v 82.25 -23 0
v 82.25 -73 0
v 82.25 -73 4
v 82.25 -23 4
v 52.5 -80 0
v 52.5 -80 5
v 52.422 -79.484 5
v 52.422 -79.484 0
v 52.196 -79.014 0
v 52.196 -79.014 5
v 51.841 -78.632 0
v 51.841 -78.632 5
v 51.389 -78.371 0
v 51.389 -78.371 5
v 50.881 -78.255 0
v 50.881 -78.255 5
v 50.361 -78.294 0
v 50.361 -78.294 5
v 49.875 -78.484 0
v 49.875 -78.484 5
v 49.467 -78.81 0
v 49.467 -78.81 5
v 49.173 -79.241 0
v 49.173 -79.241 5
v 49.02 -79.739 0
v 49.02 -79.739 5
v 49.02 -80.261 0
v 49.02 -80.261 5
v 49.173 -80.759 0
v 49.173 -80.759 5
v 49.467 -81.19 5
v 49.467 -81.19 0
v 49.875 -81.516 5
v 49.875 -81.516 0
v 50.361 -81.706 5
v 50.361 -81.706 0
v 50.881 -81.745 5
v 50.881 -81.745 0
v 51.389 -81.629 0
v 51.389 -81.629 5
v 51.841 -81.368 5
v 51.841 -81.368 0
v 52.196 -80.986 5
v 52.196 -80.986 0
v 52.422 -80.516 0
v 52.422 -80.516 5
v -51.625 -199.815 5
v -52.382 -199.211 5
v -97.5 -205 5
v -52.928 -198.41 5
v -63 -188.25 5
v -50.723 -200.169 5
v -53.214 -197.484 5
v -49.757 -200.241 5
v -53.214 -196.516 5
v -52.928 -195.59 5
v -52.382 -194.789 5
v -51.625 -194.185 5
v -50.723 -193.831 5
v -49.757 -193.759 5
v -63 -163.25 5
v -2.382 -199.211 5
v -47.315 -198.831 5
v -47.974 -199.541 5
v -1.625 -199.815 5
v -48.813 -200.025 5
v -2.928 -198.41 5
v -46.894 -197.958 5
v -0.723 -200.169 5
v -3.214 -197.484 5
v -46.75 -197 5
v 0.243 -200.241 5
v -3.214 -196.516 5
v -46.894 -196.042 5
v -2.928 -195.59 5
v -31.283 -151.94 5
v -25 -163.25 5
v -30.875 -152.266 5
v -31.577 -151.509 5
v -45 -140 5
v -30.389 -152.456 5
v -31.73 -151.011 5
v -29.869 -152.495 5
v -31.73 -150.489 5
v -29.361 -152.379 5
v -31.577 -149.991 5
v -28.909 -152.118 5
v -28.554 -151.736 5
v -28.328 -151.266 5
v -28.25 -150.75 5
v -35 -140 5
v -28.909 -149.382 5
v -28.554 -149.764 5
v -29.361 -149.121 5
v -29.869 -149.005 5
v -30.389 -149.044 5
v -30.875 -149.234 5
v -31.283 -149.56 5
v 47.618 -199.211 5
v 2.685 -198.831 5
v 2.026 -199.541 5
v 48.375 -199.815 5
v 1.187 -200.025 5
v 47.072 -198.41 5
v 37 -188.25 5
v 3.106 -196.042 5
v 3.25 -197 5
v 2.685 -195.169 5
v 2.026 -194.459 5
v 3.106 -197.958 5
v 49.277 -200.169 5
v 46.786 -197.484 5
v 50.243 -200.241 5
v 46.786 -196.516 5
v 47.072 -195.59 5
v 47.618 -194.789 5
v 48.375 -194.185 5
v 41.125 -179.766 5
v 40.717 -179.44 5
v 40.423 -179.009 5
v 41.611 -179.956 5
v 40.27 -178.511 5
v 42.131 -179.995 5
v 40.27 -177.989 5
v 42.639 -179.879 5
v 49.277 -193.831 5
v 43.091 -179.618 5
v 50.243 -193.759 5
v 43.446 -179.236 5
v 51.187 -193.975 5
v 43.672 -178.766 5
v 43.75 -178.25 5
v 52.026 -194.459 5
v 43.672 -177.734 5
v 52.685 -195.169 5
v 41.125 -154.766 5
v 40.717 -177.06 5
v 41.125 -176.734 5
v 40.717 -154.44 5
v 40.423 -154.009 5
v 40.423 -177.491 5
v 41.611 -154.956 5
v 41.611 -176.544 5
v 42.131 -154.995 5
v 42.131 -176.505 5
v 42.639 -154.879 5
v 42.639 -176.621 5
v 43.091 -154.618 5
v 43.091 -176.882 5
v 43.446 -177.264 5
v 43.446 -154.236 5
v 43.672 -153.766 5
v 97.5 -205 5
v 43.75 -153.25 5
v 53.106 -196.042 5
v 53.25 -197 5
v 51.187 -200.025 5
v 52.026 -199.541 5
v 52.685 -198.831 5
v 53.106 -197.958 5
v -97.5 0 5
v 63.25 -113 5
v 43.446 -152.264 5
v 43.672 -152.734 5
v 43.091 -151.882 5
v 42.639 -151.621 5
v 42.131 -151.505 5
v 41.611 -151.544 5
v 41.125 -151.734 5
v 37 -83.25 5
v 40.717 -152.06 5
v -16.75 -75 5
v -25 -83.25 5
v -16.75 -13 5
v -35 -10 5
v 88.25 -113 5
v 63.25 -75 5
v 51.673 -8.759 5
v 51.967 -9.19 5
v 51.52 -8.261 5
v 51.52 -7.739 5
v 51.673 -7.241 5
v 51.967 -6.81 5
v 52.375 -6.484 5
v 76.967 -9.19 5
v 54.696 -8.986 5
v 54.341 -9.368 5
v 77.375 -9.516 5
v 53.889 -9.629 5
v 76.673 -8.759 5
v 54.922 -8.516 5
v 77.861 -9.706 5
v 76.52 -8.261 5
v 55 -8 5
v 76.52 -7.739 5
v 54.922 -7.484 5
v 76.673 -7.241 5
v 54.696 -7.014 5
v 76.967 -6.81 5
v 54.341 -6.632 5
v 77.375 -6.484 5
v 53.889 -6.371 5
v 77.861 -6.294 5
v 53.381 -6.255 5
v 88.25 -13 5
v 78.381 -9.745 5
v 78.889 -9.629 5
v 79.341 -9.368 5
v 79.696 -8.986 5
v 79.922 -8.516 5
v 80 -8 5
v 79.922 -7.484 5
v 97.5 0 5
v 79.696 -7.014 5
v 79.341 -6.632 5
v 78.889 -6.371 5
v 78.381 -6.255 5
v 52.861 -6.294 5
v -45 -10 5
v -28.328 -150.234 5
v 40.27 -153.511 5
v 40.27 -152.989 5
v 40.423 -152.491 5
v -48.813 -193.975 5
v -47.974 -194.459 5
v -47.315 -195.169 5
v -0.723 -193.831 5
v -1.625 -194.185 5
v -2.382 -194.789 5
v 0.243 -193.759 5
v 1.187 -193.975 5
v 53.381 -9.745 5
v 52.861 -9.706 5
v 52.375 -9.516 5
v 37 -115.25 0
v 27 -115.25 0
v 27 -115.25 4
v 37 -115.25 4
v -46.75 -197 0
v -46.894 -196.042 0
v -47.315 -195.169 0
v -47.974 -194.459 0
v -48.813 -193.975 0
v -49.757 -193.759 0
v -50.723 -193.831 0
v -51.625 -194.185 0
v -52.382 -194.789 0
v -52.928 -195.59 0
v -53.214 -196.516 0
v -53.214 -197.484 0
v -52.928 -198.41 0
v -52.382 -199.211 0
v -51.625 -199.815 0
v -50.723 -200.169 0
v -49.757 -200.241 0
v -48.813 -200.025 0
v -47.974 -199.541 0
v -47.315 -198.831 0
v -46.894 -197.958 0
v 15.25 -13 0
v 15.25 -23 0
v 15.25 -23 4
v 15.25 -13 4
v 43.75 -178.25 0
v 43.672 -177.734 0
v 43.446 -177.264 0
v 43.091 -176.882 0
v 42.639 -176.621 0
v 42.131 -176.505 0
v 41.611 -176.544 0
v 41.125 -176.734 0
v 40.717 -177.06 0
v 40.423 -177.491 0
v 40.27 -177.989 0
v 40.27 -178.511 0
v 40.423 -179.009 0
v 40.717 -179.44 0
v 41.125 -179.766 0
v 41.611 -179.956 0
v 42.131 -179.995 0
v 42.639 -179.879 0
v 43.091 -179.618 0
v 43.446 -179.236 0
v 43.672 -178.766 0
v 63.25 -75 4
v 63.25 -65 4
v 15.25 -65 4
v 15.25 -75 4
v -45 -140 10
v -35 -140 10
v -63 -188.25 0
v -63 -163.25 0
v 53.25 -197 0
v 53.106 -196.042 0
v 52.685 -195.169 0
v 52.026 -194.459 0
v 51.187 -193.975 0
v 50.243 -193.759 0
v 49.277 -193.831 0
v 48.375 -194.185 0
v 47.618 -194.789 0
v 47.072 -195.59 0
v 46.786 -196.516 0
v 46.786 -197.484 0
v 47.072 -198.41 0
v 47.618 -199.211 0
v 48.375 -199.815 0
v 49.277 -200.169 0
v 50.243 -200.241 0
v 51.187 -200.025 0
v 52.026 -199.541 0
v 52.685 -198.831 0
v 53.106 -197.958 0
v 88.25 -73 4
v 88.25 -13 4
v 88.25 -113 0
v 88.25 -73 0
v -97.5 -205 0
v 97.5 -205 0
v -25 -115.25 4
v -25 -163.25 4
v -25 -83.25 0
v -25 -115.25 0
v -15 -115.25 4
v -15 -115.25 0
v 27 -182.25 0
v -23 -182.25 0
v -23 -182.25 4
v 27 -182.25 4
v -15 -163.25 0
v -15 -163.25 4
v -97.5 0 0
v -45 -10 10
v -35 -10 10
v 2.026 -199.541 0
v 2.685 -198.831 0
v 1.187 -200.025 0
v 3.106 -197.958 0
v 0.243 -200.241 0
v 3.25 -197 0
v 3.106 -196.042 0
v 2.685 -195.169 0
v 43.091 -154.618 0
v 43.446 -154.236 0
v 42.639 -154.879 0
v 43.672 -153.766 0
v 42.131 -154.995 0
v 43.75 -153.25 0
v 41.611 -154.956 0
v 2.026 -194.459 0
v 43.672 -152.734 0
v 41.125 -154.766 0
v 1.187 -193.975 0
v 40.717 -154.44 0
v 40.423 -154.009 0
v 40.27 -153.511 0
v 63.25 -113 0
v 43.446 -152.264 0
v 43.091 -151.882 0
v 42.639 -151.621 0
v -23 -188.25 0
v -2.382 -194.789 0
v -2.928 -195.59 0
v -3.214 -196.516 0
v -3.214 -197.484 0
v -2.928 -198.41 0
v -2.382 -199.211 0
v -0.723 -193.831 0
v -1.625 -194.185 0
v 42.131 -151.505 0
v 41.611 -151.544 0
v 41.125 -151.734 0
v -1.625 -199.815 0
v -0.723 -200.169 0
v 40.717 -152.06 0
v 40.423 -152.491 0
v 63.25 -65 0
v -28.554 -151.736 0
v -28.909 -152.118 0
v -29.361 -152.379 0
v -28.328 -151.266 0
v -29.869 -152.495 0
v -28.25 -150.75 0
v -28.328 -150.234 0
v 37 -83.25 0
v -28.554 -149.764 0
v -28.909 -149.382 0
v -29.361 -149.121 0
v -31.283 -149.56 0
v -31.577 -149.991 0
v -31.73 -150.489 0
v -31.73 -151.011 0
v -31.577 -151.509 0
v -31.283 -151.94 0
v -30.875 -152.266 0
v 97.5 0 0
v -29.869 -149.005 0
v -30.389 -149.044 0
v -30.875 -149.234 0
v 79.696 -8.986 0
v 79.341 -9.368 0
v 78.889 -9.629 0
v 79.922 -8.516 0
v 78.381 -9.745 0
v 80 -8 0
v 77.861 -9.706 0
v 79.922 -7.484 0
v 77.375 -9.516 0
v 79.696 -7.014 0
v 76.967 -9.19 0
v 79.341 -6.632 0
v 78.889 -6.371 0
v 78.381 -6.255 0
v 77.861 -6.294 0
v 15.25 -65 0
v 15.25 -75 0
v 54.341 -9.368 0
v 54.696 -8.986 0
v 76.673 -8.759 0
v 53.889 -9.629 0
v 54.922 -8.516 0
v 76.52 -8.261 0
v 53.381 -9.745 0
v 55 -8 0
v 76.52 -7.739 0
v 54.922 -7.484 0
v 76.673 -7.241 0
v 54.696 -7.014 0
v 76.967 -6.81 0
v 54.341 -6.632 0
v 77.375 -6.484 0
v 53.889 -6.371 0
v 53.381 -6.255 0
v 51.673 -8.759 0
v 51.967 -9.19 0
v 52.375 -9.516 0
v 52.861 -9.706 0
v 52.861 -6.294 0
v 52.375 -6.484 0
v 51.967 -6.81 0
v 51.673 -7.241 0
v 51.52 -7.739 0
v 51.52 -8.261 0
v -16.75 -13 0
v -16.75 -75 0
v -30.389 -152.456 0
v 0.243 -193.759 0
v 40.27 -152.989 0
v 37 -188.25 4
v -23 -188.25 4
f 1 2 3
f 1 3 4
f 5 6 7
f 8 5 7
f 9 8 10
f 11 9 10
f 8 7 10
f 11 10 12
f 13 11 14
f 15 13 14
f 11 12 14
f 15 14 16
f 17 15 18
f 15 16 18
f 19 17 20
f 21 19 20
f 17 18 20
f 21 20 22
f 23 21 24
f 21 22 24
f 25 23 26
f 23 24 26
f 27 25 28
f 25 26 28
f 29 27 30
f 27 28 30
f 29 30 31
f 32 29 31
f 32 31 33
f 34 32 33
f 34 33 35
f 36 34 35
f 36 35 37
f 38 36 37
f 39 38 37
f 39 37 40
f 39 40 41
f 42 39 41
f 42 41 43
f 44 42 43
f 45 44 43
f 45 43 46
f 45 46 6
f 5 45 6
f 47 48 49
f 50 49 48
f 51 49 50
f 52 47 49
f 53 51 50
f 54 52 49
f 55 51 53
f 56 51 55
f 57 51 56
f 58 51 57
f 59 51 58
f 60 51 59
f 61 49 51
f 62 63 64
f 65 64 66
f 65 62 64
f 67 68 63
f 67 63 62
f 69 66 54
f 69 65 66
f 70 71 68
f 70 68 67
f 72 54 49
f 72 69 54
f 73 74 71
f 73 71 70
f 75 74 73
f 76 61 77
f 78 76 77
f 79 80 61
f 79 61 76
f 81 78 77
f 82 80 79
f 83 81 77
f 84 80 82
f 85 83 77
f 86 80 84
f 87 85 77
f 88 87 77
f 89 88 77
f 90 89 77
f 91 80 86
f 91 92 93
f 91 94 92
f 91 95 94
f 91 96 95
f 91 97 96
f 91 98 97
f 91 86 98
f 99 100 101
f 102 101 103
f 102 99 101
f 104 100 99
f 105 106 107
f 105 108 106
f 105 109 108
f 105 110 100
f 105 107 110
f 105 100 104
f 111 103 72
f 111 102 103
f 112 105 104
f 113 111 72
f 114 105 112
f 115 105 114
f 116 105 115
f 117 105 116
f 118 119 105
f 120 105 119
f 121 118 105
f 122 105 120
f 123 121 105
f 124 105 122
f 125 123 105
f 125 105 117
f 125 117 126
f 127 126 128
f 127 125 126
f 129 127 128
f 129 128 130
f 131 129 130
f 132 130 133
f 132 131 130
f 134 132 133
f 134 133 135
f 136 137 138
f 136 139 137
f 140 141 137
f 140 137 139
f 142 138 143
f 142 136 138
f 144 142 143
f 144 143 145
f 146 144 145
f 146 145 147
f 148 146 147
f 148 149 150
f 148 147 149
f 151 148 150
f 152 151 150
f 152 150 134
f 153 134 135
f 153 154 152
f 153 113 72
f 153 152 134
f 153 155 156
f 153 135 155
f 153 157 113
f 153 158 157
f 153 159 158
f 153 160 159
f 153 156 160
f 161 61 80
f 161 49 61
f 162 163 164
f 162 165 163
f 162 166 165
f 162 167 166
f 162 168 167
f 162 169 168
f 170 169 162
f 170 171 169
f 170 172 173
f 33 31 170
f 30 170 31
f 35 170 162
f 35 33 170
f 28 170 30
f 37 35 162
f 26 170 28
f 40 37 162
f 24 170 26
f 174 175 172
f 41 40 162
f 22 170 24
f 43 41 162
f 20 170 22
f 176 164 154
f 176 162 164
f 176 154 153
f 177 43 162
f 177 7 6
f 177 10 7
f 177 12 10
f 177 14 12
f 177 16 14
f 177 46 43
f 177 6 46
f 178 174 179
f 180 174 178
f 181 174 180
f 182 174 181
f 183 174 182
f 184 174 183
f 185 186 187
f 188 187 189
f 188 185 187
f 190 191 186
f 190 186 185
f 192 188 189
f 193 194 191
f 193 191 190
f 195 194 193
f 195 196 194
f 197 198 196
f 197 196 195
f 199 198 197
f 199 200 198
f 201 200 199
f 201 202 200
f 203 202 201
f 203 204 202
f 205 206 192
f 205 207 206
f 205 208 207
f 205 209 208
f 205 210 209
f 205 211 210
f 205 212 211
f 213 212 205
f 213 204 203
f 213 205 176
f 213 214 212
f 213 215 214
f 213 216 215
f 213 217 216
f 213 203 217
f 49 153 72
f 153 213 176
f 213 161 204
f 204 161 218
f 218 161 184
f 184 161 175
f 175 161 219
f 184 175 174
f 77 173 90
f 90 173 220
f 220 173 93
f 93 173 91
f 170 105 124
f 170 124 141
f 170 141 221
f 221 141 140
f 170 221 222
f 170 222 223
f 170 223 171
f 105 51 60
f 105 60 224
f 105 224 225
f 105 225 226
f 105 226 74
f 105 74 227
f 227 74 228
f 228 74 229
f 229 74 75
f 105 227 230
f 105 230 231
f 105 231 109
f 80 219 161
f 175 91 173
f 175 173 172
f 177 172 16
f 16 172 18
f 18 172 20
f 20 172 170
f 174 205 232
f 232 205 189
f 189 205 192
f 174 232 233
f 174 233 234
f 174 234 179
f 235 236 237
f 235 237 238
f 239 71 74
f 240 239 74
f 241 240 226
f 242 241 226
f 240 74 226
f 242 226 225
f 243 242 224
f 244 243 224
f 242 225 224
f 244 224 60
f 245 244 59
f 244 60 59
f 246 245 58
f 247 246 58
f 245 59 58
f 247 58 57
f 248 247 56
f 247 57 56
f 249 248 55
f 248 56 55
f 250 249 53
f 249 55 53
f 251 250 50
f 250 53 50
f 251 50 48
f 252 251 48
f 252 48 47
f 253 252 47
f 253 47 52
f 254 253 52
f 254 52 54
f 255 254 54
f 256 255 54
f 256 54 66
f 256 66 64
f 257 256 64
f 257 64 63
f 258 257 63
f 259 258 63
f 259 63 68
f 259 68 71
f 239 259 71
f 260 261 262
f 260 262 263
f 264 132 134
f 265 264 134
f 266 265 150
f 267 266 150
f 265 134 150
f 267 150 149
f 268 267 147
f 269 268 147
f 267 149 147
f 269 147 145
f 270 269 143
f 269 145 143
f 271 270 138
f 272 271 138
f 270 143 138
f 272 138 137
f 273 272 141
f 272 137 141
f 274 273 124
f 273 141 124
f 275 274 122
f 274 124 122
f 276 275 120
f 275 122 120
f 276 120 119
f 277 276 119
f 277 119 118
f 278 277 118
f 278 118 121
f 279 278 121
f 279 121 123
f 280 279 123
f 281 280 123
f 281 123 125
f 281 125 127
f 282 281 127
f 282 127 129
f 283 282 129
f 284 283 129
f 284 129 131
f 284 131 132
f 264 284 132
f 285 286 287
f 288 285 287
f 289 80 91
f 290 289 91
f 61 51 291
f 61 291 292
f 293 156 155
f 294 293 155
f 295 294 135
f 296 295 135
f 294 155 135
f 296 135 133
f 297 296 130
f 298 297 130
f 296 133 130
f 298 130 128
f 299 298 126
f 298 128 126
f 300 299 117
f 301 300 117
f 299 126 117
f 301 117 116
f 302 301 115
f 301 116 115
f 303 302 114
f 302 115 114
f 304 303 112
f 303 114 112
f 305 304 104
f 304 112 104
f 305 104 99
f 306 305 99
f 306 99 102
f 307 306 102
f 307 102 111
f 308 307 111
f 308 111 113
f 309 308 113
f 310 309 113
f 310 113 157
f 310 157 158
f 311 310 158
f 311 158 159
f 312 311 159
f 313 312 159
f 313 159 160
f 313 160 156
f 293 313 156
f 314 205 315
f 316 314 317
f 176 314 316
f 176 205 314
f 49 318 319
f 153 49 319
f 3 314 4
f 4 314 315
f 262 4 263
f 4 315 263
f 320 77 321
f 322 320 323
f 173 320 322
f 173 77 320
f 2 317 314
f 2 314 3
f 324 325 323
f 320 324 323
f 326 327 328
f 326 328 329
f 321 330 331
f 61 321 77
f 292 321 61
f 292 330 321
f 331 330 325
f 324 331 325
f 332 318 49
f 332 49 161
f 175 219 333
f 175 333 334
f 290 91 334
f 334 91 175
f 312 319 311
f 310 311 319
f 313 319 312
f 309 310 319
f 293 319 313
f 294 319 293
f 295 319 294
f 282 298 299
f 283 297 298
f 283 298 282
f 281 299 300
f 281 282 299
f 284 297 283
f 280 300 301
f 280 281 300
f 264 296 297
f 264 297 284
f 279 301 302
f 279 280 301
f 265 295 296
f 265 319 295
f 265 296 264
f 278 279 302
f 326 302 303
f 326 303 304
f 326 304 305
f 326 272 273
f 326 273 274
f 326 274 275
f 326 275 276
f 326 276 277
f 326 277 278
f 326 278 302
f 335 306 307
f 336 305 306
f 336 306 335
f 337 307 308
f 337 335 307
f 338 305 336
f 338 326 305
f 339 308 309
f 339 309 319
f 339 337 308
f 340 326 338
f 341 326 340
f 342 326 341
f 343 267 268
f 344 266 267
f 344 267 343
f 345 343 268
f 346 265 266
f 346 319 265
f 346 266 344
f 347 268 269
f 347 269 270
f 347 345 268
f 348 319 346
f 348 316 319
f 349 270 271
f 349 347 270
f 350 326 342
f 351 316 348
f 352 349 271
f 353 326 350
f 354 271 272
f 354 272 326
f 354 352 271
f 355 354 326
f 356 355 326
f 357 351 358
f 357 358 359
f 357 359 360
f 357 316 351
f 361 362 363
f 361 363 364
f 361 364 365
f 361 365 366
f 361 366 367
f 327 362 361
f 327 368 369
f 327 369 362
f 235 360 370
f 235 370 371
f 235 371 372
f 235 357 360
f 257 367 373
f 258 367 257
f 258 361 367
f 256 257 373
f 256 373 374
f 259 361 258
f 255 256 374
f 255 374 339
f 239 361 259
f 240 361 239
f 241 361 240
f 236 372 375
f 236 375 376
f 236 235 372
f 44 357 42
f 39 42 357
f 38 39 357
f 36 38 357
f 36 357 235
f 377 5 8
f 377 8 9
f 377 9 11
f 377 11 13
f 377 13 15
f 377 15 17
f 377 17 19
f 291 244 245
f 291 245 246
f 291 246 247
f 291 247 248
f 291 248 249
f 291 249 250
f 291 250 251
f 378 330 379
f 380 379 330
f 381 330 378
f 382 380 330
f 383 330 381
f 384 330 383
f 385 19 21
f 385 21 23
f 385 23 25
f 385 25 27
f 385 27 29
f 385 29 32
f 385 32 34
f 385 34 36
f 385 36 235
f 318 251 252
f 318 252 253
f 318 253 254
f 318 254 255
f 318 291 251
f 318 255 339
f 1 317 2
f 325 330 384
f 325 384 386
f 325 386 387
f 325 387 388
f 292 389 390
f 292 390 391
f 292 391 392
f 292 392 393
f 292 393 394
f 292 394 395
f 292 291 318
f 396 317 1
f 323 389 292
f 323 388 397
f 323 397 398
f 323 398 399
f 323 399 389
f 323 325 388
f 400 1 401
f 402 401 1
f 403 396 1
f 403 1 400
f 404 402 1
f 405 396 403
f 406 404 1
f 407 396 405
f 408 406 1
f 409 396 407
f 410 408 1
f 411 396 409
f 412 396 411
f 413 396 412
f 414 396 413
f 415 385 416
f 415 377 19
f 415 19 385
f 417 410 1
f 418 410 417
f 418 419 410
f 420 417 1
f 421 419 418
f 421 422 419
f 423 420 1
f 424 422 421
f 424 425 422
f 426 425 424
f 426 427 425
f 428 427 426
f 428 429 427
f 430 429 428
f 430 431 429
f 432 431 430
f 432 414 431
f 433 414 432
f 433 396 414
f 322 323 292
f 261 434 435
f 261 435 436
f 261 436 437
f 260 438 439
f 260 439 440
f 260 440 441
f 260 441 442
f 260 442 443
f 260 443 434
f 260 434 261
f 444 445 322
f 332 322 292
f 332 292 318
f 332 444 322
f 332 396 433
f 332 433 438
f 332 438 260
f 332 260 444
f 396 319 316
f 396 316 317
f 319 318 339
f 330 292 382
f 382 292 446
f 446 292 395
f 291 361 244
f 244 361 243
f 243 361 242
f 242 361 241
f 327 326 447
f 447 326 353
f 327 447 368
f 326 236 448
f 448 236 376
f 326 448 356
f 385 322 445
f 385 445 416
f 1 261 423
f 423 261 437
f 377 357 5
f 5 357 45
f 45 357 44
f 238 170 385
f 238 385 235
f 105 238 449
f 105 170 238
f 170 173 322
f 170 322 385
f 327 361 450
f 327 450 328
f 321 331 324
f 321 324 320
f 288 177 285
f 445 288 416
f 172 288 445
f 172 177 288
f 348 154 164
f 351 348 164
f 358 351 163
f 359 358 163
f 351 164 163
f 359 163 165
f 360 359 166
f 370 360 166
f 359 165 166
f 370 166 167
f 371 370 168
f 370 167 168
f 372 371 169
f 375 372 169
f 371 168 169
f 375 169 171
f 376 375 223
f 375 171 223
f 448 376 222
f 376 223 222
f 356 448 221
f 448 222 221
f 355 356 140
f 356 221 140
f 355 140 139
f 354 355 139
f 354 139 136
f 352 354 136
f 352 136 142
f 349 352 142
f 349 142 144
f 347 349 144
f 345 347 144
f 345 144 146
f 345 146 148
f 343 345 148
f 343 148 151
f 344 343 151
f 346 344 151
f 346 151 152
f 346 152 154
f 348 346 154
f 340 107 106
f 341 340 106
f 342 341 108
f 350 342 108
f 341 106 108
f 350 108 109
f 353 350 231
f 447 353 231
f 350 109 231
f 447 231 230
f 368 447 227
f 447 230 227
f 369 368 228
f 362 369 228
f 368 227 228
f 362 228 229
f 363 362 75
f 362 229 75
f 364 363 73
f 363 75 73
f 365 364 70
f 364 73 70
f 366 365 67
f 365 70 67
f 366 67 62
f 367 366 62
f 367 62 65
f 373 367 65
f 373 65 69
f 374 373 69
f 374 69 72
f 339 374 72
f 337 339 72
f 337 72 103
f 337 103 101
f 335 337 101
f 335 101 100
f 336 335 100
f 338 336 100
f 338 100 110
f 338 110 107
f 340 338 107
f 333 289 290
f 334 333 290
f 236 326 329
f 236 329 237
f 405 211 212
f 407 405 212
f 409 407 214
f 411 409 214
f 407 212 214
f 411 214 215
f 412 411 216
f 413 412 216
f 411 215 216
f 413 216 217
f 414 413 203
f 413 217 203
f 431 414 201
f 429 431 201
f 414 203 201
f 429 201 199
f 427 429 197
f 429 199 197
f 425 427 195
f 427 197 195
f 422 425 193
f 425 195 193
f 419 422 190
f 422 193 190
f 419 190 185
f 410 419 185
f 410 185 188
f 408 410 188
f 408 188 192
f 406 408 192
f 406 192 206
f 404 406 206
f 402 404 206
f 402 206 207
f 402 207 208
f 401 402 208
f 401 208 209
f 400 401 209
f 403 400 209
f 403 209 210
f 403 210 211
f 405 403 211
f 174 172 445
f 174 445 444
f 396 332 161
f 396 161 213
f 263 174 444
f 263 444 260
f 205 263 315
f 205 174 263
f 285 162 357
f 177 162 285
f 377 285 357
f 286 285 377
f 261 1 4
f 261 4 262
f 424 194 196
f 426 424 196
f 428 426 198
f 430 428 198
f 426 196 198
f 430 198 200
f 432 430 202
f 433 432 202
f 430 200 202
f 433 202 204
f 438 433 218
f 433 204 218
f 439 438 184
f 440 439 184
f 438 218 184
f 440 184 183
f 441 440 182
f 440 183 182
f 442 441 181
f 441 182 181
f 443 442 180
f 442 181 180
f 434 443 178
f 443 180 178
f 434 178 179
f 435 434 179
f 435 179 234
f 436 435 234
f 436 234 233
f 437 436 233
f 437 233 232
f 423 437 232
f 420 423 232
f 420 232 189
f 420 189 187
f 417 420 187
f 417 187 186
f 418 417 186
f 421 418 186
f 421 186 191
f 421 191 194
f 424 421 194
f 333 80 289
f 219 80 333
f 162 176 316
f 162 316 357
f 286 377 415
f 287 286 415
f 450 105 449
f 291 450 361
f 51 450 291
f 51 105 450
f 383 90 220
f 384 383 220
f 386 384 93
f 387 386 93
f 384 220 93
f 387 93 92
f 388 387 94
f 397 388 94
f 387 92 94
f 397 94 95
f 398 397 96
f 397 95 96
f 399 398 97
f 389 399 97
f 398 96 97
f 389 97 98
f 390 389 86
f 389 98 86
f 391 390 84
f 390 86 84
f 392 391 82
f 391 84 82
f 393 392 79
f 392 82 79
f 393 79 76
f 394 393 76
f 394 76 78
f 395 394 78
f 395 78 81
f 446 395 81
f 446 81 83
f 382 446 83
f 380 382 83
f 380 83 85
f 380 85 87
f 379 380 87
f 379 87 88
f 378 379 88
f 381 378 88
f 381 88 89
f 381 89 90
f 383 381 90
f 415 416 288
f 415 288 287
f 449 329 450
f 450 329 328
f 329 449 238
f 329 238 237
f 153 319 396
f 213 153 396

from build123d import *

# Parameters (mm, degrees)
SKETCH1_W            = 195
SKETCH1_H            = 205
BOSS_EXTRUDE1_DEPTH  = 5
CUT_EXTRUDE2_DEPTH   = 228.060014093
SKETCH6_W            = 10
SKETCH6_H            = 48
SKETCH6_W_2          = 48
SKETCH6_H_2          = 10
BOSS_EXTRUDE3_DEPTH  = 4
SKETCH11_R           = 1.75
RETAINER_HOLES_DEPTH = 228.060014093
SKETCH14_R           = 3.25
HANDLE_MOUNT_DEPTH   = 228.060014093
SKETCH12_W           = 10
SKETCH12_H           = 130
RIBS_DEPTH           = 5


with BuildPart() as part:
    # Sketch1 → Boss-Extrude1 (new body)
    with BuildSketch(Plane.XY):
        with Locations((0, -102.5)):
            Rectangle(SKETCH1_W, SKETCH1_H)
    extrude(amount=BOSS_EXTRUDE1_DEPTH)

    # Sketch5 → Cut-Extrude2 (cut, through all)
    with BuildSketch(Plane.XY.offset(5)):
        Polygon((-25, -83.25), (37, -83.25), (37, -188.25), (-63, -188.25), (-63, -163.25), (-25, -163.25), align=None)
        Polygon((88.25, -113), (63.25, -113), (63.25, -75), (-16.75, -75), (-16.75, -13), (88.25, -13), align=None)
    extrude(amount=-CUT_EXTRUDE2_DEPTH, mode=Mode.SUBTRACT)

    # Sketch6 → Boss-Extrude3 (add)
    with BuildSketch(Plane(origin=(0, 0, 0), x_dir=(-1, 0, 0), z_dir=(0, 0, -1))):
        with Locations((20, -139.25)):
            Rectangle(SKETCH6_W, SKETCH6_H)
        Polygon((23, -188.25), (23, -182.25), (-27, -182.25), (-27, -115.25), (-37, -115.25), (-37, -188.25), align=None)
        Polygon((-88.25, -73), (-82.25, -73), (-82.25, -23), (-15.25, -23), (-15.25, -13), (-88.25, -13), align=None)
        with Locations((-39.25, -70)):
            Rectangle(SKETCH6_W_2, SKETCH6_H_2)
    extrude(amount=-BOSS_EXTRUDE3_DEPTH)

    # Sketch11 → Retainer Holes (cut, through all)
    with BuildSketch(Plane.XY.offset(5)):
        with Locations((42, -153.25)):
            Circle(SKETCH11_R)
        with Locations((42, -178.25)):
            Circle(SKETCH11_R)
        with Locations((-30, -150.75)):
            Circle(SKETCH11_R)
        with Locations((50.75, -80)):
            Circle(SKETCH11_R)
        with Locations((53.25, -8)):
            Circle(SKETCH11_R)
        with Locations((78.25, -8)):
            Circle(SKETCH11_R)
    extrude(amount=-RETAINER_HOLES_DEPTH, mode=Mode.SUBTRACT)

    # Sketch14 → Handle Mount (cut, through all)
    with BuildSketch(Plane.XY.offset(5)):
        with Locations((-50, -197)):
            Circle(SKETCH14_R)
        with Locations((50, -197)):
            Circle(SKETCH14_R)
        with Locations((0, -197)):
            Circle(SKETCH14_R)
    extrude(amount=-HANDLE_MOUNT_DEPTH, mode=Mode.SUBTRACT)

    # Sketch12 → Ribs (add)
    with BuildSketch(Plane.XY.offset(5)):
        with Locations((-40, -75)):
            Rectangle(SKETCH12_W, SKETCH12_H)
    extrude(amount=RIBS_DEPTH)


solid = part.part
